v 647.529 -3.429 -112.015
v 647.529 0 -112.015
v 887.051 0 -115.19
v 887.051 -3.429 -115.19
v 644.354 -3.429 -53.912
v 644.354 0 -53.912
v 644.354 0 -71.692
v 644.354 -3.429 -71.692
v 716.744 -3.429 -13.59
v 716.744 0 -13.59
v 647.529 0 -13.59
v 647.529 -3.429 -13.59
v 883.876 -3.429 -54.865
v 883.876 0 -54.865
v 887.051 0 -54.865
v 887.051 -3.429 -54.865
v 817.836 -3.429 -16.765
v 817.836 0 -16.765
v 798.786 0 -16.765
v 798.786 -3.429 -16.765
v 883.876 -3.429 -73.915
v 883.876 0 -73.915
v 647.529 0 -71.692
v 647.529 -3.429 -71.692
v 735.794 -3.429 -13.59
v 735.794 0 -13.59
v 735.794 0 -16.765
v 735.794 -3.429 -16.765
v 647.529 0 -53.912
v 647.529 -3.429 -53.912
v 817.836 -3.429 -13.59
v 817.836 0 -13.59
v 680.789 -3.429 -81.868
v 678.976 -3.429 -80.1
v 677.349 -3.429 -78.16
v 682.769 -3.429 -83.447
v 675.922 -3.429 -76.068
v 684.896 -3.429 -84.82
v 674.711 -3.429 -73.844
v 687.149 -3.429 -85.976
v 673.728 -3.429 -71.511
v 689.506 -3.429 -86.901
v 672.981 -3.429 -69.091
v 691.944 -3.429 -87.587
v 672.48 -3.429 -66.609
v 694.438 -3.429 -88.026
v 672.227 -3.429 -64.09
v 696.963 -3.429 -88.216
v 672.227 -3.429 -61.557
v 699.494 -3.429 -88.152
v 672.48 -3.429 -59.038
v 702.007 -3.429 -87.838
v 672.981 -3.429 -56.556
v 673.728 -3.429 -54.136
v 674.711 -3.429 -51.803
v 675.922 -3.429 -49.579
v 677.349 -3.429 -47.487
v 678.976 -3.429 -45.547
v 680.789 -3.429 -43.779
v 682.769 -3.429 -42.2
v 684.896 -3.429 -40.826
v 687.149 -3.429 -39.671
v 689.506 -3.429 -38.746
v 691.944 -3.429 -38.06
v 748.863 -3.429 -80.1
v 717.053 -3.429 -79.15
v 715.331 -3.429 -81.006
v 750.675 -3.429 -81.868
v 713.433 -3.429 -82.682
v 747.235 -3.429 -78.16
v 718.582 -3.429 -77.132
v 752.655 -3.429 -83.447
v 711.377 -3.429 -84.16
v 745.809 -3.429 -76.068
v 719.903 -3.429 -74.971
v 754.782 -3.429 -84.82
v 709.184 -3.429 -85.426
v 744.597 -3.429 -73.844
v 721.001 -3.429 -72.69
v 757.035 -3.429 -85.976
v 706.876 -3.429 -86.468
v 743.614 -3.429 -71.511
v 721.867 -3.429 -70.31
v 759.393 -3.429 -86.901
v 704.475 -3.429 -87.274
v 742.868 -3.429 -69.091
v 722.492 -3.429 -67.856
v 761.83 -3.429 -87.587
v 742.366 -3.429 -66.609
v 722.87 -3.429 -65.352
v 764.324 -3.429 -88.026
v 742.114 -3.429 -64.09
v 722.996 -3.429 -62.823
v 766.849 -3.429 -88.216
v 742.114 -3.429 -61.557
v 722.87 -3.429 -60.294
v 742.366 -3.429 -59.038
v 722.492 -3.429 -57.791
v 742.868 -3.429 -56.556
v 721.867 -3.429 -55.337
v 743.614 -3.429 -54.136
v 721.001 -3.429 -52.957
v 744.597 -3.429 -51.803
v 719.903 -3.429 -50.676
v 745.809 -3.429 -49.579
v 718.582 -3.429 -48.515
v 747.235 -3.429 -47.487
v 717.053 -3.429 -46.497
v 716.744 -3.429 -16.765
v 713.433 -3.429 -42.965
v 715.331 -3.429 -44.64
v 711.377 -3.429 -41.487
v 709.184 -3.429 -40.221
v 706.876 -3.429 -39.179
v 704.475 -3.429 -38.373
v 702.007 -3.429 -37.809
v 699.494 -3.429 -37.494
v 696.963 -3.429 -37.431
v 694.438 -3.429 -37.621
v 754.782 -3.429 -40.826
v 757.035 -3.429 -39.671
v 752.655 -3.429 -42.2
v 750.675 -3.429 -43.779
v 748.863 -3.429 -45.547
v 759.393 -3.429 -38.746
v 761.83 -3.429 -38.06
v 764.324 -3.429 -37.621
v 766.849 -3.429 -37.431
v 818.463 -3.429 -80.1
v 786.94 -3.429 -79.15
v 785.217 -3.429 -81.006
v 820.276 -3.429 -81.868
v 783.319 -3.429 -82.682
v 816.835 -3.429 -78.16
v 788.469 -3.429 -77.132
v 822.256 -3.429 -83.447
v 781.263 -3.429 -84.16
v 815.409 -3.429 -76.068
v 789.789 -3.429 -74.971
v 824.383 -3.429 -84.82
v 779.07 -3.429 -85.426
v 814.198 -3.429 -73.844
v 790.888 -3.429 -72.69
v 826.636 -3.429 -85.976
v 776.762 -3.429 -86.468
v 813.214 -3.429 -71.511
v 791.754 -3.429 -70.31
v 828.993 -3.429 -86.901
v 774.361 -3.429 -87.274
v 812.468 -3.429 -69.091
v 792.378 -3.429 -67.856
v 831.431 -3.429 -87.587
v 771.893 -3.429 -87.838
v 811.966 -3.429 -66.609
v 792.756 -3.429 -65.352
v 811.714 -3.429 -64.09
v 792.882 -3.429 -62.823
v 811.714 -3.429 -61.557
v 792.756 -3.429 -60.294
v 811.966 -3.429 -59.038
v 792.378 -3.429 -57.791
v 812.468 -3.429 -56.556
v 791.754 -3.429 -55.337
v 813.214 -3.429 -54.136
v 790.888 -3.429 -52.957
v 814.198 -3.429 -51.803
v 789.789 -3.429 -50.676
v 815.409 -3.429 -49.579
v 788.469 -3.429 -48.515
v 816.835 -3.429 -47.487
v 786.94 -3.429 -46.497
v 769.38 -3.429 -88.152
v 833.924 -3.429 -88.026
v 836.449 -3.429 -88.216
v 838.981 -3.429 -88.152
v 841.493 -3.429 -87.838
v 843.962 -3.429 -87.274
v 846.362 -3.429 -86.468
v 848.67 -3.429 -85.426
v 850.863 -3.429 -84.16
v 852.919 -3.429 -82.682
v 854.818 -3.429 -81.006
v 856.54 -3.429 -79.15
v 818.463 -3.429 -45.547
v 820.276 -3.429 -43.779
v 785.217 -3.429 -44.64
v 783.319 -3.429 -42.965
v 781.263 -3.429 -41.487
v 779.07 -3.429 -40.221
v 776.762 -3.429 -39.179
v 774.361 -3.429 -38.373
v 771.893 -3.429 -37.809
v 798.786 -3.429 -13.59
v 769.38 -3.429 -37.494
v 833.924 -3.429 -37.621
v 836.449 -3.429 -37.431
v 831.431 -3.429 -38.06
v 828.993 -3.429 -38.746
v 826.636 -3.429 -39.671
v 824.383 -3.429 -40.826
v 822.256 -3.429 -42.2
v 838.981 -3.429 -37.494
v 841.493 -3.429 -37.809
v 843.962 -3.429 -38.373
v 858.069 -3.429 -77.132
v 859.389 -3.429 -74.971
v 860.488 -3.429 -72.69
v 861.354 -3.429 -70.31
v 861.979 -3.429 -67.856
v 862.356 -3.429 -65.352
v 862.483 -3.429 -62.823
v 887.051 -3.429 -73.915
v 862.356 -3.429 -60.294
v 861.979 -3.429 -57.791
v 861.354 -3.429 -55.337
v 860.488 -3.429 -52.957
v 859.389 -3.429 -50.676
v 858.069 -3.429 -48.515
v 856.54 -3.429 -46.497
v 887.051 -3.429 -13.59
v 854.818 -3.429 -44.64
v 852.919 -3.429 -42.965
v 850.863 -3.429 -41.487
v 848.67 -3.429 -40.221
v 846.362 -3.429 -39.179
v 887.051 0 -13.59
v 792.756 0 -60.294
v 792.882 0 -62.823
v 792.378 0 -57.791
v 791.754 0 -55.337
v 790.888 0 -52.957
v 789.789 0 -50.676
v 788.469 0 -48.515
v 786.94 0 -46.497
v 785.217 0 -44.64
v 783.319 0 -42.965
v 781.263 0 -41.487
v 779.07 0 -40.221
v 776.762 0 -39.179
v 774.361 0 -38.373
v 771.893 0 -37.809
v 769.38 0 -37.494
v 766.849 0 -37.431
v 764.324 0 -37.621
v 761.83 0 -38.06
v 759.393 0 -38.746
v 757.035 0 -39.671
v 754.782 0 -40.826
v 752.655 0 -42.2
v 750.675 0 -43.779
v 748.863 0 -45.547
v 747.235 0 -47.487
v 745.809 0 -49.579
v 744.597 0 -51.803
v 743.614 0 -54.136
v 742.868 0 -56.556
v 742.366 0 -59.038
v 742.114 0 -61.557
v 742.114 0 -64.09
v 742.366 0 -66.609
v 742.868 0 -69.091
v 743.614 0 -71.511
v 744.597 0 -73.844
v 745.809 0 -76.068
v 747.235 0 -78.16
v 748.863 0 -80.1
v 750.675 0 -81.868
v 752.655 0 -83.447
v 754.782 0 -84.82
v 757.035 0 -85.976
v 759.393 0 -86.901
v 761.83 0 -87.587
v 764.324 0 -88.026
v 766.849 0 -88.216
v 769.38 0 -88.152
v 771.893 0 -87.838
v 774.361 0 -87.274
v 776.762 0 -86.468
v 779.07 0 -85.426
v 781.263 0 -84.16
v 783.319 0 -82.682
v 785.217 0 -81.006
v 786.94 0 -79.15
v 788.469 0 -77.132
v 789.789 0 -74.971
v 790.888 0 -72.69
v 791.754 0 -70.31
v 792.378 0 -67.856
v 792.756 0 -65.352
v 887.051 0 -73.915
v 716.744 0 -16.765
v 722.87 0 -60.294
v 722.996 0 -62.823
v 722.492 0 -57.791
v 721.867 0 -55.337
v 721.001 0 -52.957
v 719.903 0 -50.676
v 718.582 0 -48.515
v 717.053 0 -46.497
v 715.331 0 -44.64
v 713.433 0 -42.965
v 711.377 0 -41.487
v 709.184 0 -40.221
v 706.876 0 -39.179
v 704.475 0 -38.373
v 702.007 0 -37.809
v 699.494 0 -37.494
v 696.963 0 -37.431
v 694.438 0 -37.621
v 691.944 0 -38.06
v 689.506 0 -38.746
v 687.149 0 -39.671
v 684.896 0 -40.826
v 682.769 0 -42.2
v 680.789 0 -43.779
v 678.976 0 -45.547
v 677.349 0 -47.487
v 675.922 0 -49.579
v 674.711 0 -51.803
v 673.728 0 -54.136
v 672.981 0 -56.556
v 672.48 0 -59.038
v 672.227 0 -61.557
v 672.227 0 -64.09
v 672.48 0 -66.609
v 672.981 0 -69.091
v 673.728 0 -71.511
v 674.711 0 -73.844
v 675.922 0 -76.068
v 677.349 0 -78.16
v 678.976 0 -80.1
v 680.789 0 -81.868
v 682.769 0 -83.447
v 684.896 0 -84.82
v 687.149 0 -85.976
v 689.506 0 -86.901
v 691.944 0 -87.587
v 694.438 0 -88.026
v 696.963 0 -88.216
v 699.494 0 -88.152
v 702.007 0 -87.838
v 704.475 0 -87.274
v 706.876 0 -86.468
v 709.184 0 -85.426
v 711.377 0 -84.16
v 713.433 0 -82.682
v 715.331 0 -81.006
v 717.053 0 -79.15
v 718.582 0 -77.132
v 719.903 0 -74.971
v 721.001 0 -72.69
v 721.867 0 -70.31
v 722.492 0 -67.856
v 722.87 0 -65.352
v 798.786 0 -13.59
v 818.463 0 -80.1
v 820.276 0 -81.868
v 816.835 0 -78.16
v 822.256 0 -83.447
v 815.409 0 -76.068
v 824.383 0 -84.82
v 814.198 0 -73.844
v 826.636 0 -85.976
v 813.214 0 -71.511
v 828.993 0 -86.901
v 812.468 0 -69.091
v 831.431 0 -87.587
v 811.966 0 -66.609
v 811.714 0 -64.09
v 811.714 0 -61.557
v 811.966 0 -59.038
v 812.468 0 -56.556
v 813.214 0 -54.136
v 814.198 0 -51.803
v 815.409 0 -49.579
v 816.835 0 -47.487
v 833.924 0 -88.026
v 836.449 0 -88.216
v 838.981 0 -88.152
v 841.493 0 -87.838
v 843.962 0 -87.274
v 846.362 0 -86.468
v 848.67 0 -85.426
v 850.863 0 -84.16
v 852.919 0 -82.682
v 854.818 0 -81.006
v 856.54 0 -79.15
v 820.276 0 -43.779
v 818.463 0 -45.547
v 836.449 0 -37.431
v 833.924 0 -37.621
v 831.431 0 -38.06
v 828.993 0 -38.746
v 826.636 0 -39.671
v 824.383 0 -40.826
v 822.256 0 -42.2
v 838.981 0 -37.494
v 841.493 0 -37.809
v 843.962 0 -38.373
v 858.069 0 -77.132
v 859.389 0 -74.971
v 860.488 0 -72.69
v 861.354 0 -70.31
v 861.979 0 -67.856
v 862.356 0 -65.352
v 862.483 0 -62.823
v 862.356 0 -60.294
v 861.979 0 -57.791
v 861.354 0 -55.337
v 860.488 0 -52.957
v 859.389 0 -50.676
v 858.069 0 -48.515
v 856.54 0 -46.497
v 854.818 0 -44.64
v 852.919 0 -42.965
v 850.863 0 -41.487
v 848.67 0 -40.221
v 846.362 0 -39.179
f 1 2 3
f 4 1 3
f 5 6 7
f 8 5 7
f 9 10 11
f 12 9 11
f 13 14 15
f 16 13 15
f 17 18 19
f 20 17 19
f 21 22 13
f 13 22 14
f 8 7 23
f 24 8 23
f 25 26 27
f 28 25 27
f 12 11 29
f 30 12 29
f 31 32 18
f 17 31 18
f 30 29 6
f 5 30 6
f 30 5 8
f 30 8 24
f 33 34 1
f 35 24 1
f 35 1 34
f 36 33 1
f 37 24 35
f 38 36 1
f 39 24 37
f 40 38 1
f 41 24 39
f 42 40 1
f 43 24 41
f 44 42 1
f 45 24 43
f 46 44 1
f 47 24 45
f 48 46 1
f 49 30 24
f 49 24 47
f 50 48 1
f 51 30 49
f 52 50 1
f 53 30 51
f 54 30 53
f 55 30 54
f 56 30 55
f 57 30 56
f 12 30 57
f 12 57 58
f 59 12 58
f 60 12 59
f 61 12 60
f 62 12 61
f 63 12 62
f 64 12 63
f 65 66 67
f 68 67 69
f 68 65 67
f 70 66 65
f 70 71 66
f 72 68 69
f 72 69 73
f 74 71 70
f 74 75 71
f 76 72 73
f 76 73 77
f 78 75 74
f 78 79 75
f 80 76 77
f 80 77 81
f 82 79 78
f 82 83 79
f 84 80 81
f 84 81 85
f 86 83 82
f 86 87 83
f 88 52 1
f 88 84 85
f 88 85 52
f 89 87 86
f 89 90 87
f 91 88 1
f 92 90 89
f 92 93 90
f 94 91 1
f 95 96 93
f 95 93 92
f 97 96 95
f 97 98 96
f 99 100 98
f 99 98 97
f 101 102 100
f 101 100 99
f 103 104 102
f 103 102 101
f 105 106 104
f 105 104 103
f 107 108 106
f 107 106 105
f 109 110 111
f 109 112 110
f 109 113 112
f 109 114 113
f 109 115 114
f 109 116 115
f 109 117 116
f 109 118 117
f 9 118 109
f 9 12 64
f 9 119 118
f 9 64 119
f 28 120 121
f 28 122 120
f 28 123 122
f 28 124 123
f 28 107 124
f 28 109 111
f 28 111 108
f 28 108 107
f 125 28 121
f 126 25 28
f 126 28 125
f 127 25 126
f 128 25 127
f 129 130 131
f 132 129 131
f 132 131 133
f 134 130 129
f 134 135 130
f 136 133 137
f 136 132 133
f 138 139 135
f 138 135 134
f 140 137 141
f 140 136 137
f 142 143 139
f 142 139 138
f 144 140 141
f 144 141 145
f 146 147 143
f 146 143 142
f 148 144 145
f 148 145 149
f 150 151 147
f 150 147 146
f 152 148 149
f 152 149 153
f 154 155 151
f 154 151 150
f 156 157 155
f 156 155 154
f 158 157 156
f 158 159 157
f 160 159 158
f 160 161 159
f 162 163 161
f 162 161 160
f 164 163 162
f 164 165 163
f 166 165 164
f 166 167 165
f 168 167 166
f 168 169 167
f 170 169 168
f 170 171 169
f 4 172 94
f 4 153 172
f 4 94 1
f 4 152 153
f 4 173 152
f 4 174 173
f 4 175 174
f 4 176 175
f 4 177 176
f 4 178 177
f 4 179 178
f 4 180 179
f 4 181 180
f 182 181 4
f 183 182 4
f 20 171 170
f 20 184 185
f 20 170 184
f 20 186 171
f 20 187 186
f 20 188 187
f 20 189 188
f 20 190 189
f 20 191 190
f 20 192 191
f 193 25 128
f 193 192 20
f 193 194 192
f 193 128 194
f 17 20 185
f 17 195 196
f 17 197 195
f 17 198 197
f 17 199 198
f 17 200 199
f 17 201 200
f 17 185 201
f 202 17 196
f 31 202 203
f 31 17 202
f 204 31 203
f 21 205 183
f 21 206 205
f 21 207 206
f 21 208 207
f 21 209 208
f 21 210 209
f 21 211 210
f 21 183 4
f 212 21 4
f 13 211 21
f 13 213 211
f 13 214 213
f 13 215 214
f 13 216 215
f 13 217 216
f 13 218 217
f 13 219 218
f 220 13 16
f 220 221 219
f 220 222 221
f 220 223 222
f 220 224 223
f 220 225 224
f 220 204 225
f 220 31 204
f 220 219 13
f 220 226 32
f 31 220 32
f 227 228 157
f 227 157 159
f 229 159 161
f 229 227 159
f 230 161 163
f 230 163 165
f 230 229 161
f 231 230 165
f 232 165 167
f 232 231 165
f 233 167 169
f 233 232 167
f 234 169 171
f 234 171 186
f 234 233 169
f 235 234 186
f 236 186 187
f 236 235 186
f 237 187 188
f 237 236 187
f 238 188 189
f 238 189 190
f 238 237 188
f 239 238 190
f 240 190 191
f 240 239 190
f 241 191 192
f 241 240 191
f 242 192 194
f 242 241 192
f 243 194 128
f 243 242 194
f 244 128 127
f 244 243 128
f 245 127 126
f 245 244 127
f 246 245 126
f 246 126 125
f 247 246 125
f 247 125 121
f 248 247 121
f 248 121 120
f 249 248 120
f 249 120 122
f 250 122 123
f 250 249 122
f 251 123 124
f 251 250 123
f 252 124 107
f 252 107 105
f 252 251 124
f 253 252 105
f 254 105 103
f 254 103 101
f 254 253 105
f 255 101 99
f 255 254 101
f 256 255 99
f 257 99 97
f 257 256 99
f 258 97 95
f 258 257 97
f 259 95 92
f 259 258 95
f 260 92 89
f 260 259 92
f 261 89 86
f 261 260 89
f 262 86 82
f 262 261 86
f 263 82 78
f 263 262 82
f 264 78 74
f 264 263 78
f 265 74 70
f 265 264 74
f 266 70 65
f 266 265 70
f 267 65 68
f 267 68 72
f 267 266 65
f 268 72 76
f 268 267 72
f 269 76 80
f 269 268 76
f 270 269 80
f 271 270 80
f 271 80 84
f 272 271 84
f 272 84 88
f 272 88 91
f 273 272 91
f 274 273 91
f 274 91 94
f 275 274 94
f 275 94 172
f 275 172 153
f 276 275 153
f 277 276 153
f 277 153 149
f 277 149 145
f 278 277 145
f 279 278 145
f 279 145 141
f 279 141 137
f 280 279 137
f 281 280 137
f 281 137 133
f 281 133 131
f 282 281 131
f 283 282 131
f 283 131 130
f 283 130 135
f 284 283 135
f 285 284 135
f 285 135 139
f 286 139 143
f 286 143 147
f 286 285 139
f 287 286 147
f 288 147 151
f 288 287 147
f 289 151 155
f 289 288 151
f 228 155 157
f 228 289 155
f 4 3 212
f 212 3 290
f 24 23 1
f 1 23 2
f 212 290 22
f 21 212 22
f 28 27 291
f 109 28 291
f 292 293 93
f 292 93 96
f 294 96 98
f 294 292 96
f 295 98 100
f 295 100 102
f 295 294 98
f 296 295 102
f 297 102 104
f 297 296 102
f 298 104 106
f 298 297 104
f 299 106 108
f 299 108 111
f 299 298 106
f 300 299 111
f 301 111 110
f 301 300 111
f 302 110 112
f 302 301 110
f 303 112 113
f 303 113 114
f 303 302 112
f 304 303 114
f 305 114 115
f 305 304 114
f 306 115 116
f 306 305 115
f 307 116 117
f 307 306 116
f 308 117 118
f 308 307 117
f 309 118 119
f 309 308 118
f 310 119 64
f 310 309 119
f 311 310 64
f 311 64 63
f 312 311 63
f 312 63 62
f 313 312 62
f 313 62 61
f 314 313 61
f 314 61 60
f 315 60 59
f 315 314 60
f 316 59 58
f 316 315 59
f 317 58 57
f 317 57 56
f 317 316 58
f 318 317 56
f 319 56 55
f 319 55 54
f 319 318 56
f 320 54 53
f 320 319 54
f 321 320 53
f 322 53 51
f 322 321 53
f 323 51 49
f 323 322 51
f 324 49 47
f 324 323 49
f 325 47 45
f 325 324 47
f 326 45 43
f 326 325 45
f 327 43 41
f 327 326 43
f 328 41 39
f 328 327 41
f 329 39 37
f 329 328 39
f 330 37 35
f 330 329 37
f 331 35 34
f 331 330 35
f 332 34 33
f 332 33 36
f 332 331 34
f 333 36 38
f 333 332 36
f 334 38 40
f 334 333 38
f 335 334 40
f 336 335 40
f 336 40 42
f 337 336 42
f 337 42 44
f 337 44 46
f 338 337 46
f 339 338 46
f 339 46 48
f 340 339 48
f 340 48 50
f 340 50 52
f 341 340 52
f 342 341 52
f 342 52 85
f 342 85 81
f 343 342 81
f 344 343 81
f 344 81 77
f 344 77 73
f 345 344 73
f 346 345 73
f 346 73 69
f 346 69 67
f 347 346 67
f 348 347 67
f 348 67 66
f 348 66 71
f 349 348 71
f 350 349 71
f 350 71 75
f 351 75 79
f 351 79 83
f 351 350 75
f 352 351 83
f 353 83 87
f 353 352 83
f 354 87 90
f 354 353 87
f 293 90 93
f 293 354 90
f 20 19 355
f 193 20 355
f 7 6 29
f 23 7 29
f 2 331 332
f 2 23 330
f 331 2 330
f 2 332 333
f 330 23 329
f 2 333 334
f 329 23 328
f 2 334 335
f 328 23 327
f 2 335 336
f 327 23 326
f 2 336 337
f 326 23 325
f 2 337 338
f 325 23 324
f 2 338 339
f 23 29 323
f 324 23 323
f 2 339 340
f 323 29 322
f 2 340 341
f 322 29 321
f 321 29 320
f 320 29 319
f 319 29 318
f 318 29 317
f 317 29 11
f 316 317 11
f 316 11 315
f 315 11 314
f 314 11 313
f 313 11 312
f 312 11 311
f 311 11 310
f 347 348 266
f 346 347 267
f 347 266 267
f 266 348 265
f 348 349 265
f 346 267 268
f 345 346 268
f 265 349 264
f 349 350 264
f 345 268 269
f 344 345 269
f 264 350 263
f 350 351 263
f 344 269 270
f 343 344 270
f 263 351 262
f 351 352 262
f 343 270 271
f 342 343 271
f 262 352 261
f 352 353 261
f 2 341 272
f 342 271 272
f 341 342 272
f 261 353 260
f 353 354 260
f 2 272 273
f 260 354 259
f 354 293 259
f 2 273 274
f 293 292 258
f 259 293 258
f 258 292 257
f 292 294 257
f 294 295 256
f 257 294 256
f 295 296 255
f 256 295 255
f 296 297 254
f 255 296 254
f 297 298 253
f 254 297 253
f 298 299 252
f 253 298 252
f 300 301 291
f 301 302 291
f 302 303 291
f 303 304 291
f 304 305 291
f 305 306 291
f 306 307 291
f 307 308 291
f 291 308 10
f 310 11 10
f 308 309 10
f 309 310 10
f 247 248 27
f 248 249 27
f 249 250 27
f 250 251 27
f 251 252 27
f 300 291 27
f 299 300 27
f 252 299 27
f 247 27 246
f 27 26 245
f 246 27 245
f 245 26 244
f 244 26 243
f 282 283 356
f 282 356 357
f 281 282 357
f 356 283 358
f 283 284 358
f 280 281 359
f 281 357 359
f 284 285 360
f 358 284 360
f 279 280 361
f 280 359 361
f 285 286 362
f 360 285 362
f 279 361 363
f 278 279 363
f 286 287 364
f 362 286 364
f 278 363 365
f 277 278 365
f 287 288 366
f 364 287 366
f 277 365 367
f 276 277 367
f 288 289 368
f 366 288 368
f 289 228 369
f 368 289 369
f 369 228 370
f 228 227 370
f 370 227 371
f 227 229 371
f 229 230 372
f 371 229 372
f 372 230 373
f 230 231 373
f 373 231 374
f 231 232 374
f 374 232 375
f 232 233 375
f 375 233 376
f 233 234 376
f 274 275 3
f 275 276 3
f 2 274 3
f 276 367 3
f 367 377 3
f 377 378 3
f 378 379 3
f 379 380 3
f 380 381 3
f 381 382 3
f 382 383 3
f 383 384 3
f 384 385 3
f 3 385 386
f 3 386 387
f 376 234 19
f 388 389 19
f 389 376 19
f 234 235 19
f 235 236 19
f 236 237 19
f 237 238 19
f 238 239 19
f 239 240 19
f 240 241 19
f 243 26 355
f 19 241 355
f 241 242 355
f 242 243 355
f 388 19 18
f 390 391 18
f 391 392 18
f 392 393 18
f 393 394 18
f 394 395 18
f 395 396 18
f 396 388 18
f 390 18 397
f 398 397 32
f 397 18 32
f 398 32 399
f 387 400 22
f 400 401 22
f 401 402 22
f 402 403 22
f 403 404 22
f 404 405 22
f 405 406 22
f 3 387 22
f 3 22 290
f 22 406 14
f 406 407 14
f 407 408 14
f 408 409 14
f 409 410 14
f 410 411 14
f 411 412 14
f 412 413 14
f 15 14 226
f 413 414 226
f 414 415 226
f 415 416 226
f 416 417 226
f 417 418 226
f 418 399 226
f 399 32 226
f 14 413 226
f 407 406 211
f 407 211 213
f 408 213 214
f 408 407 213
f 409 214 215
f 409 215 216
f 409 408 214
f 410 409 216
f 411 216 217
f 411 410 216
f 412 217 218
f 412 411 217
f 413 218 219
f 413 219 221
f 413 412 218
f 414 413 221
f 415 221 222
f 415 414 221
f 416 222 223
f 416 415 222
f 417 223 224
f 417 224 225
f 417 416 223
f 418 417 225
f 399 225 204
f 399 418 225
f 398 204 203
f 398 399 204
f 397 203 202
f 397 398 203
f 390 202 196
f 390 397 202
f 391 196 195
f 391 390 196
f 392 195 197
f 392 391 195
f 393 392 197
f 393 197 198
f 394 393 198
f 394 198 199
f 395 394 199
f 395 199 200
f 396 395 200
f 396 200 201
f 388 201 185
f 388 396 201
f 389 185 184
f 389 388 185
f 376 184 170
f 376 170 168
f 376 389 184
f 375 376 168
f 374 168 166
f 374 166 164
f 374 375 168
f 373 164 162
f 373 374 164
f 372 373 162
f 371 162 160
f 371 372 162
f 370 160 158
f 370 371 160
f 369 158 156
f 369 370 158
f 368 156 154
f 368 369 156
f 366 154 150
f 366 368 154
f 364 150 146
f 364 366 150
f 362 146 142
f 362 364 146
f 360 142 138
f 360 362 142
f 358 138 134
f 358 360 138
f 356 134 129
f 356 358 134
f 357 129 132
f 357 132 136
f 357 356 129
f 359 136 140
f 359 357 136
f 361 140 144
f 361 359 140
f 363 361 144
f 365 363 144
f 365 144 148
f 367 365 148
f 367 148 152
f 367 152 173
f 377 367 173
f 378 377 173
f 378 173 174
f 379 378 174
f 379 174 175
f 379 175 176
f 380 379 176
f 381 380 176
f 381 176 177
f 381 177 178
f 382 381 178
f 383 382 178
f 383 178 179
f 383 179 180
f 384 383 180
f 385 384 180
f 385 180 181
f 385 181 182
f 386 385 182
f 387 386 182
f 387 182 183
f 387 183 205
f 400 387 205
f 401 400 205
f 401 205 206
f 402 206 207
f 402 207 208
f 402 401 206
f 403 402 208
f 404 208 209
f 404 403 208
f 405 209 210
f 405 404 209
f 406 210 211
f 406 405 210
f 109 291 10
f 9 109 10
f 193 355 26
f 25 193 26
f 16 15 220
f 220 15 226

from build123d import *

# Parameters (mm, degrees)
F0_R     = 25.4
F1_DEPTH = 3.429


with BuildPart() as f1:
    # F0 (on Front) → F1 (new body)
    with BuildSketch(Plane.XZ):
        Polygon((644.354287, -53.912491), (644.354287, -71.692491), (647.529287, -71.692491), (647.529287, -112.014991), (887.051287, -115.189991), (887.051287, -73.914991), (883.876287, -73.914991), (883.876287, -54.864991), (887.051287, -54.864991), (887.051287, -13.589991), (817.836287, -13.589991), (817.836287, -16.764991), (798.786287, -16.764991), (798.786287, -13.589991), (735.794287, -13.589991), (735.794287, -16.764991), (716.744287, -16.764991), (716.744287, -13.589991), (647.529287, -13.589991), (647.529287, -53.912491), align=None)
        with Locations((697.595912, -62.823446)):
            Circle(F0_R, mode=Mode.SUBTRACT)
        with Locations((767.482107, -62.823446)):
            Circle(F0_R, mode=Mode.SUBTRACT)
        with Locations((837.082629, -62.823446)):
            Circle(F0_R, mode=Mode.SUBTRACT)
    extrude(amount=F1_DEPTH)


solid = f1.part
